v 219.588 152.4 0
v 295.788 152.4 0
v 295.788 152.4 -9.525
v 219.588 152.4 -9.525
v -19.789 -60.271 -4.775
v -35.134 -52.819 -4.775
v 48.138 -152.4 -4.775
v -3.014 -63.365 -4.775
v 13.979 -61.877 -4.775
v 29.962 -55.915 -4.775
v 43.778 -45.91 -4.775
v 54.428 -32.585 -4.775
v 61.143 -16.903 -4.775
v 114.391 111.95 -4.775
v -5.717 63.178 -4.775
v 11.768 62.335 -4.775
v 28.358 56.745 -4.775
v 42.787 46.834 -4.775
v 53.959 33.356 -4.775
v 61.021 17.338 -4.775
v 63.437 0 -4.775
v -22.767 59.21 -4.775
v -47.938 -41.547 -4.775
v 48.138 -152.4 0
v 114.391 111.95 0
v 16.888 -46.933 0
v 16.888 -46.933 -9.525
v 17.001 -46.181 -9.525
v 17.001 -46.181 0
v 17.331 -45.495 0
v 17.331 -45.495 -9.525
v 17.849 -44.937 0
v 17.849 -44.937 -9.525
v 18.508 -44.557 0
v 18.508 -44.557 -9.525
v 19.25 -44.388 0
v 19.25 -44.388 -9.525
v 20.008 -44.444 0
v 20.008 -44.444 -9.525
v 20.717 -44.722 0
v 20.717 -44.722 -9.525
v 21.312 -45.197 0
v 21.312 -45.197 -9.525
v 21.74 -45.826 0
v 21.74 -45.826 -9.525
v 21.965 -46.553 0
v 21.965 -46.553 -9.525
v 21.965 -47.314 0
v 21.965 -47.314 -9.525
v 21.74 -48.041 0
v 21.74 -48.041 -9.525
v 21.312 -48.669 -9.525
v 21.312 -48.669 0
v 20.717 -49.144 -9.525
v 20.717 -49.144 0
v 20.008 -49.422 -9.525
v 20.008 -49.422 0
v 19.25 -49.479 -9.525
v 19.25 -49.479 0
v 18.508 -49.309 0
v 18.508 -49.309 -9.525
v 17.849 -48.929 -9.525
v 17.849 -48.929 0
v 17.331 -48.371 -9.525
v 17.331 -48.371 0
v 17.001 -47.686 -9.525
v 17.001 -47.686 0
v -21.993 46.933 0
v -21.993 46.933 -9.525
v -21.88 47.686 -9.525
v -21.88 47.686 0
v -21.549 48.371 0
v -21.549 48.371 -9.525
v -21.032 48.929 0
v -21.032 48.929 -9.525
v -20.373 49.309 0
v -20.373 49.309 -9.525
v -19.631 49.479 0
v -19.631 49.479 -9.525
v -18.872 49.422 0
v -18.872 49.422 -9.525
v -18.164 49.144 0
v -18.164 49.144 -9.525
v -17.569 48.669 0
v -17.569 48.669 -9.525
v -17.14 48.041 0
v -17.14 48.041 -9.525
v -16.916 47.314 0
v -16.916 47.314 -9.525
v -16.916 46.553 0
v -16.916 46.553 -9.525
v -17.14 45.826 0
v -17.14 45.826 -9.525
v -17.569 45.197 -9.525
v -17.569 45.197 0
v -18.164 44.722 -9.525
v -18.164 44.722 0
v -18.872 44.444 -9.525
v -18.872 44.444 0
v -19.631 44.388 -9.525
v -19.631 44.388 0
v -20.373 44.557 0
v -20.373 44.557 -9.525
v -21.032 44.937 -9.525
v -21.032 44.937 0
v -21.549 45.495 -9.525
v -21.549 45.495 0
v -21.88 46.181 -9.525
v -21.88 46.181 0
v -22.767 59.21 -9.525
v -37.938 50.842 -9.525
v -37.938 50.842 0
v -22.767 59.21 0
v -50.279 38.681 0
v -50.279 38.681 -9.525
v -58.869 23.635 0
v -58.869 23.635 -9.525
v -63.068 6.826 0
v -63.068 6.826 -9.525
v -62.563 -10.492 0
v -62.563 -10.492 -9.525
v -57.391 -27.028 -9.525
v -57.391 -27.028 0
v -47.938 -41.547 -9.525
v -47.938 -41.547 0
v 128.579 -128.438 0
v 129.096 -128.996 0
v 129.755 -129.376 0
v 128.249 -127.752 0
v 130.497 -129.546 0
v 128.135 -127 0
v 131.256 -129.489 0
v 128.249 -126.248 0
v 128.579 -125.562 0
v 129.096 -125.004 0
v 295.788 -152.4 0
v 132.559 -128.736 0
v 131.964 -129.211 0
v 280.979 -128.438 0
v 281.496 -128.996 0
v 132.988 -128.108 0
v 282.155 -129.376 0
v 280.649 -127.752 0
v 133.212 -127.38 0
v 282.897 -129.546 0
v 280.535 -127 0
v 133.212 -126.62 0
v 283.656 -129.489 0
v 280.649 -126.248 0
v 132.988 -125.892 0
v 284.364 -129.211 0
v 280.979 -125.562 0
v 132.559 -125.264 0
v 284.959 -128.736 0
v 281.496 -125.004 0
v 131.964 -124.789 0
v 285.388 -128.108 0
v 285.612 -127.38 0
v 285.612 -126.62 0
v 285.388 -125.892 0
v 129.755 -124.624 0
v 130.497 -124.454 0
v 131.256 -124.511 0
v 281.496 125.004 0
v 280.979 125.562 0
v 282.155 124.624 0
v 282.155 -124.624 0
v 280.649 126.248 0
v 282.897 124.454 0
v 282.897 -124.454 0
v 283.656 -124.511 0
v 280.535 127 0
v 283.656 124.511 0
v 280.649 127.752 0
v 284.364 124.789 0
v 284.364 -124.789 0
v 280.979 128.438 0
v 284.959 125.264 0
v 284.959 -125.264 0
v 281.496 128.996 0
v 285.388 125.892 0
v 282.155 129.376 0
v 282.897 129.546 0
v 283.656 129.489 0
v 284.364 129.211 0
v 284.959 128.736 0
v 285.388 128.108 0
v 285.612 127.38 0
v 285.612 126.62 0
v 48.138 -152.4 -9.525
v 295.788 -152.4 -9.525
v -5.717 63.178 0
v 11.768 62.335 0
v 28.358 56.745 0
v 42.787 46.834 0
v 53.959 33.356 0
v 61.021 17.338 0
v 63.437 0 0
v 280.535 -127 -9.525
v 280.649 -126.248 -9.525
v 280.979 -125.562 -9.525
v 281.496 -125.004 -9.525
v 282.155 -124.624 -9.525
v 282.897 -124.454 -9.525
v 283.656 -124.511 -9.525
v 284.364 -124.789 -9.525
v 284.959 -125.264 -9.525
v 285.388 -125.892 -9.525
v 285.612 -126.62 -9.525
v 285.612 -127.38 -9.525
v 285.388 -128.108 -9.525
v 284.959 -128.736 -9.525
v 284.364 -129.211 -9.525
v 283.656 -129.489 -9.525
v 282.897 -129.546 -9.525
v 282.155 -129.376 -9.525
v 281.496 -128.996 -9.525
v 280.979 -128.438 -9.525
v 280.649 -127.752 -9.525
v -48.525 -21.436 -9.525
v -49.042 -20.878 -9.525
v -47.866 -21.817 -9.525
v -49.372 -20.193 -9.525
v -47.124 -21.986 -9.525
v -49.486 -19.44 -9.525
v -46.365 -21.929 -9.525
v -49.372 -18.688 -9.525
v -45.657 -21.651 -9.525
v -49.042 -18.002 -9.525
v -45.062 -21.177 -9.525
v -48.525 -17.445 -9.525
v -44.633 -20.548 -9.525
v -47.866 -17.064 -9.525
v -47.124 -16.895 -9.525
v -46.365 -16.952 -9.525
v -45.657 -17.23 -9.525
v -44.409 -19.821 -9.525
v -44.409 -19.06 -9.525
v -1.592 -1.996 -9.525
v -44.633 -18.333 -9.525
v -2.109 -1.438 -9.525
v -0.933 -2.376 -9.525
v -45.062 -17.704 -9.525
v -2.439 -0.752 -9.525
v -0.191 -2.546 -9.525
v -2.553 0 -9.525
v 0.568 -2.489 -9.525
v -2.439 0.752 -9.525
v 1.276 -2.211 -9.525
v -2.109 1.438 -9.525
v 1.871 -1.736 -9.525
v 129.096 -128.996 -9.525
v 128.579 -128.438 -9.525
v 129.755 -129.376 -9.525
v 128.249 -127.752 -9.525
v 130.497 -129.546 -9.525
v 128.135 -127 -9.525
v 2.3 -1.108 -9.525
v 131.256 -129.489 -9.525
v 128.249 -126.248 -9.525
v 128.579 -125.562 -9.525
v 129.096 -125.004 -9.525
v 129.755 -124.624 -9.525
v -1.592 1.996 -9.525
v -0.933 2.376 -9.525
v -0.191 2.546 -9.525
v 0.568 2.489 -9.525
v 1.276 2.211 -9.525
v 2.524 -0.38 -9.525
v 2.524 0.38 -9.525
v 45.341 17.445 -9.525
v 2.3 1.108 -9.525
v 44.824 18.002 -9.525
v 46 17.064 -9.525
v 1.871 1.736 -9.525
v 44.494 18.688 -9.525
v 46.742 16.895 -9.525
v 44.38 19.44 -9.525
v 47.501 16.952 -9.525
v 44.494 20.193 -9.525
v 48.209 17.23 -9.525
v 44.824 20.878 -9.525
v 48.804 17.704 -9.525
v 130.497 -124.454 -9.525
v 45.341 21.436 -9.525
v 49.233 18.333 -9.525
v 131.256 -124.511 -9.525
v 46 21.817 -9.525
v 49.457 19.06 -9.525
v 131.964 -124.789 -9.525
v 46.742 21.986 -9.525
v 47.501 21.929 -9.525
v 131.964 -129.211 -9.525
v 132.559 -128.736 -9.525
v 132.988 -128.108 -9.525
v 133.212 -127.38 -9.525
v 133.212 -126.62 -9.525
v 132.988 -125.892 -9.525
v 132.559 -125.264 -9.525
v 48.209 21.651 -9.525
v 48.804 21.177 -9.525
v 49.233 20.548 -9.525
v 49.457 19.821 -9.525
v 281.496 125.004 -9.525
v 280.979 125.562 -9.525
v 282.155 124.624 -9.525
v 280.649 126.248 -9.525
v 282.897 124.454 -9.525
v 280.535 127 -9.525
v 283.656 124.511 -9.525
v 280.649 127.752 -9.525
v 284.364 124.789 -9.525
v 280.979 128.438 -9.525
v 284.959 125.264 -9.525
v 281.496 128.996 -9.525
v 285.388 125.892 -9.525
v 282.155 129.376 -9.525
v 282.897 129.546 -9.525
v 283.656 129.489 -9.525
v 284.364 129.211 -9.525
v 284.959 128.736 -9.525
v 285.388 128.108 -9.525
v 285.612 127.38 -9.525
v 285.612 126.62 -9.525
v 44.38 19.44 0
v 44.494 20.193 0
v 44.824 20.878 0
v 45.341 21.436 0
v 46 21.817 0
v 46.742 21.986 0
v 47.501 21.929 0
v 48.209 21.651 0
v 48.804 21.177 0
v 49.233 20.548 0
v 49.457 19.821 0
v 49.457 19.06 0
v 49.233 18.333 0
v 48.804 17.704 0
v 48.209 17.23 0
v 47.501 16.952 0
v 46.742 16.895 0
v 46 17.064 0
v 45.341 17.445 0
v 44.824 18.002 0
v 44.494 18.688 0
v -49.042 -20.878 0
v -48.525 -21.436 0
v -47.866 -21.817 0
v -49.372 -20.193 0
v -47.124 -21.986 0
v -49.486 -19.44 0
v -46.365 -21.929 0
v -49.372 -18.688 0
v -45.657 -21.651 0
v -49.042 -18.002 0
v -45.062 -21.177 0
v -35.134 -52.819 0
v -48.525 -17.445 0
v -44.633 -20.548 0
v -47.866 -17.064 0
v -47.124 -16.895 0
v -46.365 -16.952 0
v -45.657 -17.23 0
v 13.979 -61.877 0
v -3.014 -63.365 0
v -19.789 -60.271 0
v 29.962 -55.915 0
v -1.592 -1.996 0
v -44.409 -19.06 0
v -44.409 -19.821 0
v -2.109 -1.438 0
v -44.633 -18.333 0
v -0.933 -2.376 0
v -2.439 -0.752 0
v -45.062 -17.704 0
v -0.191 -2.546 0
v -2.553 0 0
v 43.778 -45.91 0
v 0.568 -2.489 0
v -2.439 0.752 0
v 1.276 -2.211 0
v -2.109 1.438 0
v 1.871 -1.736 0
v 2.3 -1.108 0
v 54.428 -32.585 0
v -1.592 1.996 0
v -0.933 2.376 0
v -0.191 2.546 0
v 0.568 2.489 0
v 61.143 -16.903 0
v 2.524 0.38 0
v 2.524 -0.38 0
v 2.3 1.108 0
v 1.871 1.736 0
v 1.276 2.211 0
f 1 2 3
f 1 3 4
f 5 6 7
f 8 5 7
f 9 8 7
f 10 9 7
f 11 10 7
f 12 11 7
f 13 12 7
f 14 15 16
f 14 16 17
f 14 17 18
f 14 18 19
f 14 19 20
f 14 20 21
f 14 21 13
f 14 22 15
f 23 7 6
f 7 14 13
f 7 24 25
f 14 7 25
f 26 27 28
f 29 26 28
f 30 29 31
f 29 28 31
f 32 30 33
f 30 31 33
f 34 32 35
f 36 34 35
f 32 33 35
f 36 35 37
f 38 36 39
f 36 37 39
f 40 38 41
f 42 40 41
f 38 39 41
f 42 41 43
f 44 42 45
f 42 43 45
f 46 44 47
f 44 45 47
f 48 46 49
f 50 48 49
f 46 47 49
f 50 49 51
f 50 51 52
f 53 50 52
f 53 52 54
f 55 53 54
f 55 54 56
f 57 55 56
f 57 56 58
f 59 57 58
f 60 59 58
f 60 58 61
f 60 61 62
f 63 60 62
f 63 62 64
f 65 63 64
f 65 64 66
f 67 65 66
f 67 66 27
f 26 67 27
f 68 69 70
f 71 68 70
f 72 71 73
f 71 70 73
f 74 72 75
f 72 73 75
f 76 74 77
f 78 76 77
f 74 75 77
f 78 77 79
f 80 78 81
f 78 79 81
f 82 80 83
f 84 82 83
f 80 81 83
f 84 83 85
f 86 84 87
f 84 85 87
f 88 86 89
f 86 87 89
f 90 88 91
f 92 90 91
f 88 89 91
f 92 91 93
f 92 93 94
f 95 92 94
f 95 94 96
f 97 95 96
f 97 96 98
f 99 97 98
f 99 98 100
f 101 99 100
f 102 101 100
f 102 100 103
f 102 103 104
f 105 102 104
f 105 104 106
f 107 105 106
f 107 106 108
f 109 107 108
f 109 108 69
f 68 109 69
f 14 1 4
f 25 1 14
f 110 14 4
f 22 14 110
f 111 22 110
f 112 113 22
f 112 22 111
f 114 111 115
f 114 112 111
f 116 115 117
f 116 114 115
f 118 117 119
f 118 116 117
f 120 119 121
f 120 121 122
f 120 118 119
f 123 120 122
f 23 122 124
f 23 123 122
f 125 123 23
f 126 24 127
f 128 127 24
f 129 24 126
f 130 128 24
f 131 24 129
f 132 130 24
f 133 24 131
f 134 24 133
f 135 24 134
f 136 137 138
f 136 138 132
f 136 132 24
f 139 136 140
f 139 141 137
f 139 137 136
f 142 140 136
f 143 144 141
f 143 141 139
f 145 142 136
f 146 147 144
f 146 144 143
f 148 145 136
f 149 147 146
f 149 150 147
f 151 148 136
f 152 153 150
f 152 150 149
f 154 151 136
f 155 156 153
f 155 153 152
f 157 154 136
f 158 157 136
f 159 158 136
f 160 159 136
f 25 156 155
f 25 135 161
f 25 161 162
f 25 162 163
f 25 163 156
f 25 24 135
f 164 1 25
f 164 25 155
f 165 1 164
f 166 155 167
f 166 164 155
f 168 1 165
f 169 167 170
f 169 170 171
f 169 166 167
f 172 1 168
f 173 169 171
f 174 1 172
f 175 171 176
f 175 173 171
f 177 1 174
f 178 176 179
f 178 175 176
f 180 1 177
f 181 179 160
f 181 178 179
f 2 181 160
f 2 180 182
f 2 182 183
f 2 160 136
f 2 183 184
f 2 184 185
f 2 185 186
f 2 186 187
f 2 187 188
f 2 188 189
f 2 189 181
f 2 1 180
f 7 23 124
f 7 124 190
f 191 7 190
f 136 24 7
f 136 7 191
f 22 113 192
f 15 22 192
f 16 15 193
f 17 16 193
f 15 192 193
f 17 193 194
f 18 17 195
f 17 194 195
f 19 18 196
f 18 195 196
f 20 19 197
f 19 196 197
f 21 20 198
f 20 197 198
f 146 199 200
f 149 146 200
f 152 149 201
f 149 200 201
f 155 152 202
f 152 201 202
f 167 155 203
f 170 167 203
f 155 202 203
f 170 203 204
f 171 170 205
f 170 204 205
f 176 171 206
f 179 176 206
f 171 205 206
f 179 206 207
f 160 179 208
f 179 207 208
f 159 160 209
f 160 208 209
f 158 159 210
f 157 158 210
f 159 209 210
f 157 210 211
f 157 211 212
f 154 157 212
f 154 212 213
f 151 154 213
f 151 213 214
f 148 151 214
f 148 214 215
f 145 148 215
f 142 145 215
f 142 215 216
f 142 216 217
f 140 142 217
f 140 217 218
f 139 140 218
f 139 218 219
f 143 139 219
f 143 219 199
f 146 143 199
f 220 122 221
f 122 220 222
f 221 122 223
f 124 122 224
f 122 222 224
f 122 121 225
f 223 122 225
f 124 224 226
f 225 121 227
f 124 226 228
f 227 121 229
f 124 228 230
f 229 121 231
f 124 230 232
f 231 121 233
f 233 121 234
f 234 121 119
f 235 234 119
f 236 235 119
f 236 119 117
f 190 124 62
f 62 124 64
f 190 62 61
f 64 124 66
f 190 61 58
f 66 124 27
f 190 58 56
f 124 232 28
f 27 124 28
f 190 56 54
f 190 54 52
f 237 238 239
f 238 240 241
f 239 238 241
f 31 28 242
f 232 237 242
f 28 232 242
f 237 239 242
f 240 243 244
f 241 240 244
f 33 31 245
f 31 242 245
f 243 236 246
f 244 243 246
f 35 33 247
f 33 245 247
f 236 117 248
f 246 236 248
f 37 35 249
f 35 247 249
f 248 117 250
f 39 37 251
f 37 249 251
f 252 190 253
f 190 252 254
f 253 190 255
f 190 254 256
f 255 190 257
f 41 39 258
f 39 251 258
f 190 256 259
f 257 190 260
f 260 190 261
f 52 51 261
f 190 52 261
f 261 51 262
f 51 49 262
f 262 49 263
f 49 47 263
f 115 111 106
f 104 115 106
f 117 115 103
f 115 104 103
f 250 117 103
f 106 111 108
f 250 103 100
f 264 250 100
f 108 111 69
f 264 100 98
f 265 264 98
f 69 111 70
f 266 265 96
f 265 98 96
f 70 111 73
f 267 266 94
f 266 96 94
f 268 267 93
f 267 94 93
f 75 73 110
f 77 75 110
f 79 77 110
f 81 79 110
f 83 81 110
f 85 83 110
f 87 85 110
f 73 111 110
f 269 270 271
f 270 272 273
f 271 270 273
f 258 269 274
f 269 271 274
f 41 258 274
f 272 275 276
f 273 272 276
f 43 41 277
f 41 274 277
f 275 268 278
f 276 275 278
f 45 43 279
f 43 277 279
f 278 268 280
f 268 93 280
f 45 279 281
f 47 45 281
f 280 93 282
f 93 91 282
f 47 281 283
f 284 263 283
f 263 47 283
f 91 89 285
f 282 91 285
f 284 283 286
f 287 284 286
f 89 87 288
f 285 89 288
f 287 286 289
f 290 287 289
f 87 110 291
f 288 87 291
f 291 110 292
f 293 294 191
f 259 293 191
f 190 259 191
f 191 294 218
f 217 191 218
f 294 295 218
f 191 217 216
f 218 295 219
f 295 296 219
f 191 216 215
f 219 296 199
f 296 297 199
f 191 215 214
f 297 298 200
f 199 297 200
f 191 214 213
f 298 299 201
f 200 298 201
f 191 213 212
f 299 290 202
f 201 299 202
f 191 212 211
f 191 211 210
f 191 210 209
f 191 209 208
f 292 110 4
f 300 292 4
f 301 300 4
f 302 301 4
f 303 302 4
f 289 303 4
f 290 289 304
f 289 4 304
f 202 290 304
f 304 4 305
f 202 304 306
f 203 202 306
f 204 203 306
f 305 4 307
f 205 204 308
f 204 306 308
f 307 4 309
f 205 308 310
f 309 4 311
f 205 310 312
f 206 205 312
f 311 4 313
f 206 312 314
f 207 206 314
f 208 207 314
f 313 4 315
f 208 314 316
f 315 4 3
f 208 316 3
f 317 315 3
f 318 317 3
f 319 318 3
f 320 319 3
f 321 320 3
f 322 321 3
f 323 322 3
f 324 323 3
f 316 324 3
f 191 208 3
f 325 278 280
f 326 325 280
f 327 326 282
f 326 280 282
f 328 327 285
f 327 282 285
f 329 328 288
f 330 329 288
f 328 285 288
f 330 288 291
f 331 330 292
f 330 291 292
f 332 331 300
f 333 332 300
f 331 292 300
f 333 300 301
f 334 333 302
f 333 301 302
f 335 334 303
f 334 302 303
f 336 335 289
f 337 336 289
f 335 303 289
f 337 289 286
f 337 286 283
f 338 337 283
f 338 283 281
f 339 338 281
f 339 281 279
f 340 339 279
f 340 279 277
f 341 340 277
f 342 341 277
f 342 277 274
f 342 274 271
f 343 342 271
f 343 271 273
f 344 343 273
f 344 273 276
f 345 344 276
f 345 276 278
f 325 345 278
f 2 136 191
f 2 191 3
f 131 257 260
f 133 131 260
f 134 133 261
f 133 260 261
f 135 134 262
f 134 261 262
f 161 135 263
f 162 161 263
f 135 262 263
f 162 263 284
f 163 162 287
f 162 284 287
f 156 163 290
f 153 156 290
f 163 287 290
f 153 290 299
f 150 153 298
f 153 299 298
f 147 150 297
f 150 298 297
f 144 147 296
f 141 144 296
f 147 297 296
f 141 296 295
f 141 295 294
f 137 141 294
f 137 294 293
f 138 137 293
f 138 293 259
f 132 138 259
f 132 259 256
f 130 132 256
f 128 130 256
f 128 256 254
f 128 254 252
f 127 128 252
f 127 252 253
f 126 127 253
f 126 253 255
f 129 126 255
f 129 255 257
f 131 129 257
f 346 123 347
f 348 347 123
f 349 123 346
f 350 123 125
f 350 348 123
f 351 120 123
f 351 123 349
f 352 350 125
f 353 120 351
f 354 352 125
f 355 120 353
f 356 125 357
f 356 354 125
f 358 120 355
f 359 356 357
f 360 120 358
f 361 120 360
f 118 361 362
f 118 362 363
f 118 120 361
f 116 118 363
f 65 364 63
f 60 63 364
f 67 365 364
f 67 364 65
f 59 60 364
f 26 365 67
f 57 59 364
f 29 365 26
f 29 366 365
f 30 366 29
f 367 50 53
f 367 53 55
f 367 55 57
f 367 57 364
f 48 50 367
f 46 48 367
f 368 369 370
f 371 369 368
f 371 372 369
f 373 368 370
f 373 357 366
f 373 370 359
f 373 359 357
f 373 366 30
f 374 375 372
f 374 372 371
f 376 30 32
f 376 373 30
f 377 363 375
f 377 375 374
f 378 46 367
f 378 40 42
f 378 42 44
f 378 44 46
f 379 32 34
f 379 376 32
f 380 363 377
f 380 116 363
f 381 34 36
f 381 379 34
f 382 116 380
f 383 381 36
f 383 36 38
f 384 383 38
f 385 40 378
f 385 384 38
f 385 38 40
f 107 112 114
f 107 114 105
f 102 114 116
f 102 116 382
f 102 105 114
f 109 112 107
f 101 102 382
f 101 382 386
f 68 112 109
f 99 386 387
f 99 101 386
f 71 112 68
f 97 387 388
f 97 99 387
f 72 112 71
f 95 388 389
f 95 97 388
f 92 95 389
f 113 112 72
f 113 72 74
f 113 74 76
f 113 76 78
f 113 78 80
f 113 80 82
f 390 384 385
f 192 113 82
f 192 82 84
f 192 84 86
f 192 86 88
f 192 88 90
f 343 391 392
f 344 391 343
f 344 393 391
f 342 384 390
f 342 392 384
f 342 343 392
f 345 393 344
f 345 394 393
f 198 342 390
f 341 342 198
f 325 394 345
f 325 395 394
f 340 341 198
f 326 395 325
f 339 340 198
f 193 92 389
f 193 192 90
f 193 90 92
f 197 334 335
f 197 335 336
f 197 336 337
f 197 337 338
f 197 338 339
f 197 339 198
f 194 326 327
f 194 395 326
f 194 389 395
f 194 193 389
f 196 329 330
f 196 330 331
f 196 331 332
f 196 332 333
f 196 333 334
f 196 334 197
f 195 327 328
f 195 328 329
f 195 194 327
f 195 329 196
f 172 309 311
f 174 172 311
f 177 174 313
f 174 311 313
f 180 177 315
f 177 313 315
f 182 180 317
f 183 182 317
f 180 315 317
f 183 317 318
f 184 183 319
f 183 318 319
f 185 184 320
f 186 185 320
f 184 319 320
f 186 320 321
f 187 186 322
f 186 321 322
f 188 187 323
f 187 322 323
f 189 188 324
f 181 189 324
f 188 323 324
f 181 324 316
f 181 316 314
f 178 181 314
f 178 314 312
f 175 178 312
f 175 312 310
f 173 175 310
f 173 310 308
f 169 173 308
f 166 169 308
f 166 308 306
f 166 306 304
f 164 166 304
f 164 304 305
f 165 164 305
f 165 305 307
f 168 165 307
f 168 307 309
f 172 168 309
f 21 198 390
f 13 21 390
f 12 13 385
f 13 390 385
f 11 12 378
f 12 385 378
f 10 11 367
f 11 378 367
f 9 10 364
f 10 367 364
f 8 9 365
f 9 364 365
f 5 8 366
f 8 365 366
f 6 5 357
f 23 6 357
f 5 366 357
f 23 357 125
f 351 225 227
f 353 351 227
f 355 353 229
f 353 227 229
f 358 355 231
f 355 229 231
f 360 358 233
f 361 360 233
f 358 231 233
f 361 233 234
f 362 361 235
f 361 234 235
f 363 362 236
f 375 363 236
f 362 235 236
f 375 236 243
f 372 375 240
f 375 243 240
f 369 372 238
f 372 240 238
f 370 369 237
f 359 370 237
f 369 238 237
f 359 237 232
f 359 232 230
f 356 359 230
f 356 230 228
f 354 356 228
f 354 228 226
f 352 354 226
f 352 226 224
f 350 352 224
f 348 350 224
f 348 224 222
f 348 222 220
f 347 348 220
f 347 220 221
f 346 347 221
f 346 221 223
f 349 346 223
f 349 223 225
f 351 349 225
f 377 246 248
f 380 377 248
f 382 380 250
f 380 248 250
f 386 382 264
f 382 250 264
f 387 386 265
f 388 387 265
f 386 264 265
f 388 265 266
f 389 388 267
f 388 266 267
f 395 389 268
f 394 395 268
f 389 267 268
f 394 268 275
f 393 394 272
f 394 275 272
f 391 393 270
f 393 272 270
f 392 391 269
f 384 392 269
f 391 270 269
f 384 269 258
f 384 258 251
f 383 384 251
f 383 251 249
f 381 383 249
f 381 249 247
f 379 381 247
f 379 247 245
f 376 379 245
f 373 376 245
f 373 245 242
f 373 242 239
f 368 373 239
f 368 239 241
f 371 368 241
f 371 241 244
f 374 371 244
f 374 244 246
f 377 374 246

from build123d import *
from build123d.topology import SkipClean

# Parameters (mm, degrees)
BOSS_EXTRUDE1_DEPTH     = 9.525
CUT_EXTRUDE4_DEPTH      = 4.7752
F_1_4_20_TAPPED_HOLE1_D = 5.1054


with BuildPart() as part:
    # Sketch1 → Boss-Extrude1 (new body)
    with BuildSketch(Plane.XY):
        with BuildLine():
            ThreePointArc((-22.767324083, 59.210121486), (-61.545192335, 15.374616506), (-47.937560329, -41.547320514))
            Line((-47.937560329, -41.547320514), (48.13808, -152.4))
            Line((48.13808, -152.4), (295.78808, -152.4))
            Line((295.78808, -152.4), (295.78808, 152.4))
            Line((295.78808, 152.4), (219.58808, 152.4))
            Line((219.58808, 152.4), (-22.767324083, 59.210121486))
        make_face()
    extrude(amount=-BOSS_EXTRUDE1_DEPTH)

    # Sketch1_5 → Cut-Extrude4 (cut)
    with SkipClean():  # keep this step's faces unmerged: merging them makes the solid invalid here
        with BuildSketch(Plane.XY):
            with BuildLine():
                Line((114.391061614, 111.949912244), (-22.767324083, 59.210121486))
                ThreePointArc((-22.767324083, 59.210121486), (35.915944774, 52.289907661), (63.4365, 0))
                ThreePointArc((63.4365, 0), (22.172037417, -59.435597827), (-47.937560329, -41.547320514))
                Line((-47.937560329, -41.547320514), (48.13808, -152.4))
                Line((48.13808, -152.4), (114.391061614, 111.949912244))
            make_face()
        extrude(amount=-CUT_EXTRUDE4_DEPTH, mode=Mode.SUBTRACT)

    # 1_4-20 Tapped Hole1 (through all)
    with Locations(Plane.XY):
        with Locations((283.08808, 127), (283.08808, -127), (130.68808, -127), (46.933080252, 19.440318364), (19.440318364, -46.933080252), (-46.933080252, -19.440318364), (-19.440318364, 46.933080252), (0, 0)):
            Hole(F_1_4_20_TAPPED_HOLE1_D / 2)


solid = part.part
